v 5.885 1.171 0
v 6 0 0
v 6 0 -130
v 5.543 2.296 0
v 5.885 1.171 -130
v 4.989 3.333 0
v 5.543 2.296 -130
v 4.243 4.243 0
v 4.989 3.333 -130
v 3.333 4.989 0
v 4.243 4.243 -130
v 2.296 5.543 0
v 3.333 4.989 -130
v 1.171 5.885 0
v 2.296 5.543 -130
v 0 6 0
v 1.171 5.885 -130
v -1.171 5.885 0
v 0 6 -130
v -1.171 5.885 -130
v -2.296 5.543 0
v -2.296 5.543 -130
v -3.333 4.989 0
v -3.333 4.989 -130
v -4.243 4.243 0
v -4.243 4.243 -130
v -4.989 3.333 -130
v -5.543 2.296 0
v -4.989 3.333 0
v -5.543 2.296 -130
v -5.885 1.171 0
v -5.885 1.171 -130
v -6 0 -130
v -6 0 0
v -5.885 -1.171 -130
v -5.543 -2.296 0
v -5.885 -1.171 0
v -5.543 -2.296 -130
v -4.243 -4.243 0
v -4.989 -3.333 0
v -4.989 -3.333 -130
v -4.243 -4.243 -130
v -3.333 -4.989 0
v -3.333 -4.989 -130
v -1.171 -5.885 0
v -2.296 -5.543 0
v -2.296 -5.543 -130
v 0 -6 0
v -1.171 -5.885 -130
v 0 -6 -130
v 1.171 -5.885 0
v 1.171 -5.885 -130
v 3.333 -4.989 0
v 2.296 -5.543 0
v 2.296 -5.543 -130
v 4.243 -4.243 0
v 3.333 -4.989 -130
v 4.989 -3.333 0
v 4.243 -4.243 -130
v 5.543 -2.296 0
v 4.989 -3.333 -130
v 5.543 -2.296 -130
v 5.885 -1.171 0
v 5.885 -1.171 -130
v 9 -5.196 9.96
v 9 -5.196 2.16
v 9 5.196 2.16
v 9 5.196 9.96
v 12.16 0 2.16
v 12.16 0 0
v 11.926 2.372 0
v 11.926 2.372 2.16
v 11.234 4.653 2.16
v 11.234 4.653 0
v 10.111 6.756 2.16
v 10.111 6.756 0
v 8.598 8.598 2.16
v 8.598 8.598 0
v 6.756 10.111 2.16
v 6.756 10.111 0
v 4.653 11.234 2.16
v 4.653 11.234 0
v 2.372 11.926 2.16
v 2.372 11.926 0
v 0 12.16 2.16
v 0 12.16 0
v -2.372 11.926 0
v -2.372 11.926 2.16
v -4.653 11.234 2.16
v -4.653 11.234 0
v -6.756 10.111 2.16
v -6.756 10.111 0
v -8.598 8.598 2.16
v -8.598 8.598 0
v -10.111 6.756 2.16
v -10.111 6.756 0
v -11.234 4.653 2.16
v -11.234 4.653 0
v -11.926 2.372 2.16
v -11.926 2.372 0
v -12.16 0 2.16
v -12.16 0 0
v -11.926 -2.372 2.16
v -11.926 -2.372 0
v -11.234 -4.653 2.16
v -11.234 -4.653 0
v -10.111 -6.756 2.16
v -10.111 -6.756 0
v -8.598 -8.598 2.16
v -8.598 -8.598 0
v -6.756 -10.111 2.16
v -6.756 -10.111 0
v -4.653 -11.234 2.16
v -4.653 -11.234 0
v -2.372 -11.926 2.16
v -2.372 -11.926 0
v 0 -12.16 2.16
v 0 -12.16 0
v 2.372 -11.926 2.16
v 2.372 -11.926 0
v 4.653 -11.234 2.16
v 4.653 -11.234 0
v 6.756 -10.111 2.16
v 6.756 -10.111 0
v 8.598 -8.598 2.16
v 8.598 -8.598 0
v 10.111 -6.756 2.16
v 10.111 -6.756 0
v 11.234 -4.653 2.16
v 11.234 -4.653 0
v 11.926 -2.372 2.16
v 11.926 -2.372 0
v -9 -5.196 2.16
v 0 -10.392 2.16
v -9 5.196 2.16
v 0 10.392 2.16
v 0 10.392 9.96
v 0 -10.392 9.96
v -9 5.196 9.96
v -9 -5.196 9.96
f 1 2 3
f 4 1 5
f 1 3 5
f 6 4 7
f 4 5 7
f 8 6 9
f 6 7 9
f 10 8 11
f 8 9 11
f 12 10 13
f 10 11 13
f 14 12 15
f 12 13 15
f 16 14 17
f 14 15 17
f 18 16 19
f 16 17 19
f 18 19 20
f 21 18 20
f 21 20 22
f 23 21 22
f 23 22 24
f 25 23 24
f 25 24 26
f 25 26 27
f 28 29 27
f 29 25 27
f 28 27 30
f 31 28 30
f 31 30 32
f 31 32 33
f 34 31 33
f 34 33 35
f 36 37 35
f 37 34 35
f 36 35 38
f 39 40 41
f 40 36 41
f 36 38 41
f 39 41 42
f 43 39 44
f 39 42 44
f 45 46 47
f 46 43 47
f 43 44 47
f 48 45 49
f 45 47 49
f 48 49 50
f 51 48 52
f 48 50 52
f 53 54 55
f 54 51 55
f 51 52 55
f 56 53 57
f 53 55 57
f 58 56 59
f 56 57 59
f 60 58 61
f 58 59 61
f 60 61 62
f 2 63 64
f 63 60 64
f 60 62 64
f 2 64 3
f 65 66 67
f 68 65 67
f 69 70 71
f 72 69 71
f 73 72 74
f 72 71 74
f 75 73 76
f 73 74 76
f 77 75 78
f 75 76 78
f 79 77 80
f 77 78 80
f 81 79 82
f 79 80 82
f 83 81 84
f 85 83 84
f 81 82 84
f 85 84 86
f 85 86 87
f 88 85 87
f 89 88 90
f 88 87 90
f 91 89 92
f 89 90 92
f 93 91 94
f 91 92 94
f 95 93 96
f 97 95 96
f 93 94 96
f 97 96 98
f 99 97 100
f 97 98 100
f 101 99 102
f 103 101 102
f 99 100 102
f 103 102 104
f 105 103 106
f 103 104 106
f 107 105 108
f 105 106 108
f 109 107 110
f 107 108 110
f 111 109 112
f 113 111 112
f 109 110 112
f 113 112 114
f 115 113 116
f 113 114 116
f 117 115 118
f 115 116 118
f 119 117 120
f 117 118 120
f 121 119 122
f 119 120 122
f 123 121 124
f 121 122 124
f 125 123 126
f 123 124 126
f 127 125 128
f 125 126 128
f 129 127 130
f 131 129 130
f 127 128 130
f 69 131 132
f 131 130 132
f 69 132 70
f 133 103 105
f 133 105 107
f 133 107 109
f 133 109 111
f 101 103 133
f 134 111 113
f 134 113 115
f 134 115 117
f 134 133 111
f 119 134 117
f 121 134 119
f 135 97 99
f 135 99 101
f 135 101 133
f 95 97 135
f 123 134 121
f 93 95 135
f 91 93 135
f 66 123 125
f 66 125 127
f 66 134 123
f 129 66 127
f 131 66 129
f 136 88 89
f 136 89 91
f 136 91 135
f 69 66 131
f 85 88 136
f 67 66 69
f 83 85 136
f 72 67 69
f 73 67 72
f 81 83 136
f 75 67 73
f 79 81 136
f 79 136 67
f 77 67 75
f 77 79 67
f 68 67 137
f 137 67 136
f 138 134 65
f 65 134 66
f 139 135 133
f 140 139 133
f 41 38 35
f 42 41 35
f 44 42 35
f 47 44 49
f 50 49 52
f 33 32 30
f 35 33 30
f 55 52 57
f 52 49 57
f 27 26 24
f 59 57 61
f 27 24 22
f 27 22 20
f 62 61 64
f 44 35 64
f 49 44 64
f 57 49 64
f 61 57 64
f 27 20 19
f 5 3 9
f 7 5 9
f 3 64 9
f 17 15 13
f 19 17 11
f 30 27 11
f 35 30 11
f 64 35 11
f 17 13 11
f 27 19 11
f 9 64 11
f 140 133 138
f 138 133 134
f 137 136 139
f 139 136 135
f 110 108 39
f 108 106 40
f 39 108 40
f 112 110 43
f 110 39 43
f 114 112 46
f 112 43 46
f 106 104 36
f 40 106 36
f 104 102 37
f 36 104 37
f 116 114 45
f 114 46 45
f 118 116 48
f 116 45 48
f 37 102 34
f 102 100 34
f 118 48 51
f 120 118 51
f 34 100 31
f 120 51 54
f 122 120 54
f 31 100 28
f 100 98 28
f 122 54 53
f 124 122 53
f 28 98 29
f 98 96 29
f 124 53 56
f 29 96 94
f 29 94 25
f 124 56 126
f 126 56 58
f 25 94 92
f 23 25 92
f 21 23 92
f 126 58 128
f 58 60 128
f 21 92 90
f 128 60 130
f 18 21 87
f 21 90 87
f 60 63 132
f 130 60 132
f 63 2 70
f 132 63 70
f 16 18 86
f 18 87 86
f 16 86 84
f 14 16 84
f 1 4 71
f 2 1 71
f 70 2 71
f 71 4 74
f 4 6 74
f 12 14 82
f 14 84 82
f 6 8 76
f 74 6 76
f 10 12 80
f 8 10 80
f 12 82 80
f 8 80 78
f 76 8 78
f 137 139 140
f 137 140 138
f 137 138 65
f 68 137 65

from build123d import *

# Parameters (mm, degrees)
EXTRUDE_SKETCH_1_R = 12.16
EXTRUDE_1_DEPTH    = 2.16
EXTRUDE_START      = 2.16
EXTRUDE_2_DEPTH    = 7.8
EXTRUDE_START_2    = -130
EXTRUDE_SKETCH_3_R = 6
EXTRUDE_3_DEPTH    = 130.01


with BuildPart() as part:
    # Extrude sketch 1 → Extrude 1 (new body)
    with BuildSketch(Plane.XY):
        Circle(EXTRUDE_SKETCH_1_R)
    extrude(amount=EXTRUDE_1_DEPTH)


with BuildPart() as body_2:
    # Extrude sketch 2 → Extrude 2 (new body)
    with BuildSketch(Plane.XY.offset(EXTRUDE_START)):
        Polygon((9, 5.196152423), (0, 10.392304845), (-9, 5.196152423), (-9, -5.196152423), (0, -10.392304845), (9, -5.196152423), align=None)
    extrude(amount=EXTRUDE_2_DEPTH)


with BuildPart() as body_3:
    # Extrude sketch 3 → Extrude 3 (new body)
    with BuildSketch(Plane.XY.offset(EXTRUDE_START_2)):
        Circle(EXTRUDE_SKETCH_3_R)
    extrude(amount=EXTRUDE_3_DEPTH)

    # Combine (weld / assembly of features): union body 2, part
    add(body_2.part)
    add(part.part)


solid = body_3.part
